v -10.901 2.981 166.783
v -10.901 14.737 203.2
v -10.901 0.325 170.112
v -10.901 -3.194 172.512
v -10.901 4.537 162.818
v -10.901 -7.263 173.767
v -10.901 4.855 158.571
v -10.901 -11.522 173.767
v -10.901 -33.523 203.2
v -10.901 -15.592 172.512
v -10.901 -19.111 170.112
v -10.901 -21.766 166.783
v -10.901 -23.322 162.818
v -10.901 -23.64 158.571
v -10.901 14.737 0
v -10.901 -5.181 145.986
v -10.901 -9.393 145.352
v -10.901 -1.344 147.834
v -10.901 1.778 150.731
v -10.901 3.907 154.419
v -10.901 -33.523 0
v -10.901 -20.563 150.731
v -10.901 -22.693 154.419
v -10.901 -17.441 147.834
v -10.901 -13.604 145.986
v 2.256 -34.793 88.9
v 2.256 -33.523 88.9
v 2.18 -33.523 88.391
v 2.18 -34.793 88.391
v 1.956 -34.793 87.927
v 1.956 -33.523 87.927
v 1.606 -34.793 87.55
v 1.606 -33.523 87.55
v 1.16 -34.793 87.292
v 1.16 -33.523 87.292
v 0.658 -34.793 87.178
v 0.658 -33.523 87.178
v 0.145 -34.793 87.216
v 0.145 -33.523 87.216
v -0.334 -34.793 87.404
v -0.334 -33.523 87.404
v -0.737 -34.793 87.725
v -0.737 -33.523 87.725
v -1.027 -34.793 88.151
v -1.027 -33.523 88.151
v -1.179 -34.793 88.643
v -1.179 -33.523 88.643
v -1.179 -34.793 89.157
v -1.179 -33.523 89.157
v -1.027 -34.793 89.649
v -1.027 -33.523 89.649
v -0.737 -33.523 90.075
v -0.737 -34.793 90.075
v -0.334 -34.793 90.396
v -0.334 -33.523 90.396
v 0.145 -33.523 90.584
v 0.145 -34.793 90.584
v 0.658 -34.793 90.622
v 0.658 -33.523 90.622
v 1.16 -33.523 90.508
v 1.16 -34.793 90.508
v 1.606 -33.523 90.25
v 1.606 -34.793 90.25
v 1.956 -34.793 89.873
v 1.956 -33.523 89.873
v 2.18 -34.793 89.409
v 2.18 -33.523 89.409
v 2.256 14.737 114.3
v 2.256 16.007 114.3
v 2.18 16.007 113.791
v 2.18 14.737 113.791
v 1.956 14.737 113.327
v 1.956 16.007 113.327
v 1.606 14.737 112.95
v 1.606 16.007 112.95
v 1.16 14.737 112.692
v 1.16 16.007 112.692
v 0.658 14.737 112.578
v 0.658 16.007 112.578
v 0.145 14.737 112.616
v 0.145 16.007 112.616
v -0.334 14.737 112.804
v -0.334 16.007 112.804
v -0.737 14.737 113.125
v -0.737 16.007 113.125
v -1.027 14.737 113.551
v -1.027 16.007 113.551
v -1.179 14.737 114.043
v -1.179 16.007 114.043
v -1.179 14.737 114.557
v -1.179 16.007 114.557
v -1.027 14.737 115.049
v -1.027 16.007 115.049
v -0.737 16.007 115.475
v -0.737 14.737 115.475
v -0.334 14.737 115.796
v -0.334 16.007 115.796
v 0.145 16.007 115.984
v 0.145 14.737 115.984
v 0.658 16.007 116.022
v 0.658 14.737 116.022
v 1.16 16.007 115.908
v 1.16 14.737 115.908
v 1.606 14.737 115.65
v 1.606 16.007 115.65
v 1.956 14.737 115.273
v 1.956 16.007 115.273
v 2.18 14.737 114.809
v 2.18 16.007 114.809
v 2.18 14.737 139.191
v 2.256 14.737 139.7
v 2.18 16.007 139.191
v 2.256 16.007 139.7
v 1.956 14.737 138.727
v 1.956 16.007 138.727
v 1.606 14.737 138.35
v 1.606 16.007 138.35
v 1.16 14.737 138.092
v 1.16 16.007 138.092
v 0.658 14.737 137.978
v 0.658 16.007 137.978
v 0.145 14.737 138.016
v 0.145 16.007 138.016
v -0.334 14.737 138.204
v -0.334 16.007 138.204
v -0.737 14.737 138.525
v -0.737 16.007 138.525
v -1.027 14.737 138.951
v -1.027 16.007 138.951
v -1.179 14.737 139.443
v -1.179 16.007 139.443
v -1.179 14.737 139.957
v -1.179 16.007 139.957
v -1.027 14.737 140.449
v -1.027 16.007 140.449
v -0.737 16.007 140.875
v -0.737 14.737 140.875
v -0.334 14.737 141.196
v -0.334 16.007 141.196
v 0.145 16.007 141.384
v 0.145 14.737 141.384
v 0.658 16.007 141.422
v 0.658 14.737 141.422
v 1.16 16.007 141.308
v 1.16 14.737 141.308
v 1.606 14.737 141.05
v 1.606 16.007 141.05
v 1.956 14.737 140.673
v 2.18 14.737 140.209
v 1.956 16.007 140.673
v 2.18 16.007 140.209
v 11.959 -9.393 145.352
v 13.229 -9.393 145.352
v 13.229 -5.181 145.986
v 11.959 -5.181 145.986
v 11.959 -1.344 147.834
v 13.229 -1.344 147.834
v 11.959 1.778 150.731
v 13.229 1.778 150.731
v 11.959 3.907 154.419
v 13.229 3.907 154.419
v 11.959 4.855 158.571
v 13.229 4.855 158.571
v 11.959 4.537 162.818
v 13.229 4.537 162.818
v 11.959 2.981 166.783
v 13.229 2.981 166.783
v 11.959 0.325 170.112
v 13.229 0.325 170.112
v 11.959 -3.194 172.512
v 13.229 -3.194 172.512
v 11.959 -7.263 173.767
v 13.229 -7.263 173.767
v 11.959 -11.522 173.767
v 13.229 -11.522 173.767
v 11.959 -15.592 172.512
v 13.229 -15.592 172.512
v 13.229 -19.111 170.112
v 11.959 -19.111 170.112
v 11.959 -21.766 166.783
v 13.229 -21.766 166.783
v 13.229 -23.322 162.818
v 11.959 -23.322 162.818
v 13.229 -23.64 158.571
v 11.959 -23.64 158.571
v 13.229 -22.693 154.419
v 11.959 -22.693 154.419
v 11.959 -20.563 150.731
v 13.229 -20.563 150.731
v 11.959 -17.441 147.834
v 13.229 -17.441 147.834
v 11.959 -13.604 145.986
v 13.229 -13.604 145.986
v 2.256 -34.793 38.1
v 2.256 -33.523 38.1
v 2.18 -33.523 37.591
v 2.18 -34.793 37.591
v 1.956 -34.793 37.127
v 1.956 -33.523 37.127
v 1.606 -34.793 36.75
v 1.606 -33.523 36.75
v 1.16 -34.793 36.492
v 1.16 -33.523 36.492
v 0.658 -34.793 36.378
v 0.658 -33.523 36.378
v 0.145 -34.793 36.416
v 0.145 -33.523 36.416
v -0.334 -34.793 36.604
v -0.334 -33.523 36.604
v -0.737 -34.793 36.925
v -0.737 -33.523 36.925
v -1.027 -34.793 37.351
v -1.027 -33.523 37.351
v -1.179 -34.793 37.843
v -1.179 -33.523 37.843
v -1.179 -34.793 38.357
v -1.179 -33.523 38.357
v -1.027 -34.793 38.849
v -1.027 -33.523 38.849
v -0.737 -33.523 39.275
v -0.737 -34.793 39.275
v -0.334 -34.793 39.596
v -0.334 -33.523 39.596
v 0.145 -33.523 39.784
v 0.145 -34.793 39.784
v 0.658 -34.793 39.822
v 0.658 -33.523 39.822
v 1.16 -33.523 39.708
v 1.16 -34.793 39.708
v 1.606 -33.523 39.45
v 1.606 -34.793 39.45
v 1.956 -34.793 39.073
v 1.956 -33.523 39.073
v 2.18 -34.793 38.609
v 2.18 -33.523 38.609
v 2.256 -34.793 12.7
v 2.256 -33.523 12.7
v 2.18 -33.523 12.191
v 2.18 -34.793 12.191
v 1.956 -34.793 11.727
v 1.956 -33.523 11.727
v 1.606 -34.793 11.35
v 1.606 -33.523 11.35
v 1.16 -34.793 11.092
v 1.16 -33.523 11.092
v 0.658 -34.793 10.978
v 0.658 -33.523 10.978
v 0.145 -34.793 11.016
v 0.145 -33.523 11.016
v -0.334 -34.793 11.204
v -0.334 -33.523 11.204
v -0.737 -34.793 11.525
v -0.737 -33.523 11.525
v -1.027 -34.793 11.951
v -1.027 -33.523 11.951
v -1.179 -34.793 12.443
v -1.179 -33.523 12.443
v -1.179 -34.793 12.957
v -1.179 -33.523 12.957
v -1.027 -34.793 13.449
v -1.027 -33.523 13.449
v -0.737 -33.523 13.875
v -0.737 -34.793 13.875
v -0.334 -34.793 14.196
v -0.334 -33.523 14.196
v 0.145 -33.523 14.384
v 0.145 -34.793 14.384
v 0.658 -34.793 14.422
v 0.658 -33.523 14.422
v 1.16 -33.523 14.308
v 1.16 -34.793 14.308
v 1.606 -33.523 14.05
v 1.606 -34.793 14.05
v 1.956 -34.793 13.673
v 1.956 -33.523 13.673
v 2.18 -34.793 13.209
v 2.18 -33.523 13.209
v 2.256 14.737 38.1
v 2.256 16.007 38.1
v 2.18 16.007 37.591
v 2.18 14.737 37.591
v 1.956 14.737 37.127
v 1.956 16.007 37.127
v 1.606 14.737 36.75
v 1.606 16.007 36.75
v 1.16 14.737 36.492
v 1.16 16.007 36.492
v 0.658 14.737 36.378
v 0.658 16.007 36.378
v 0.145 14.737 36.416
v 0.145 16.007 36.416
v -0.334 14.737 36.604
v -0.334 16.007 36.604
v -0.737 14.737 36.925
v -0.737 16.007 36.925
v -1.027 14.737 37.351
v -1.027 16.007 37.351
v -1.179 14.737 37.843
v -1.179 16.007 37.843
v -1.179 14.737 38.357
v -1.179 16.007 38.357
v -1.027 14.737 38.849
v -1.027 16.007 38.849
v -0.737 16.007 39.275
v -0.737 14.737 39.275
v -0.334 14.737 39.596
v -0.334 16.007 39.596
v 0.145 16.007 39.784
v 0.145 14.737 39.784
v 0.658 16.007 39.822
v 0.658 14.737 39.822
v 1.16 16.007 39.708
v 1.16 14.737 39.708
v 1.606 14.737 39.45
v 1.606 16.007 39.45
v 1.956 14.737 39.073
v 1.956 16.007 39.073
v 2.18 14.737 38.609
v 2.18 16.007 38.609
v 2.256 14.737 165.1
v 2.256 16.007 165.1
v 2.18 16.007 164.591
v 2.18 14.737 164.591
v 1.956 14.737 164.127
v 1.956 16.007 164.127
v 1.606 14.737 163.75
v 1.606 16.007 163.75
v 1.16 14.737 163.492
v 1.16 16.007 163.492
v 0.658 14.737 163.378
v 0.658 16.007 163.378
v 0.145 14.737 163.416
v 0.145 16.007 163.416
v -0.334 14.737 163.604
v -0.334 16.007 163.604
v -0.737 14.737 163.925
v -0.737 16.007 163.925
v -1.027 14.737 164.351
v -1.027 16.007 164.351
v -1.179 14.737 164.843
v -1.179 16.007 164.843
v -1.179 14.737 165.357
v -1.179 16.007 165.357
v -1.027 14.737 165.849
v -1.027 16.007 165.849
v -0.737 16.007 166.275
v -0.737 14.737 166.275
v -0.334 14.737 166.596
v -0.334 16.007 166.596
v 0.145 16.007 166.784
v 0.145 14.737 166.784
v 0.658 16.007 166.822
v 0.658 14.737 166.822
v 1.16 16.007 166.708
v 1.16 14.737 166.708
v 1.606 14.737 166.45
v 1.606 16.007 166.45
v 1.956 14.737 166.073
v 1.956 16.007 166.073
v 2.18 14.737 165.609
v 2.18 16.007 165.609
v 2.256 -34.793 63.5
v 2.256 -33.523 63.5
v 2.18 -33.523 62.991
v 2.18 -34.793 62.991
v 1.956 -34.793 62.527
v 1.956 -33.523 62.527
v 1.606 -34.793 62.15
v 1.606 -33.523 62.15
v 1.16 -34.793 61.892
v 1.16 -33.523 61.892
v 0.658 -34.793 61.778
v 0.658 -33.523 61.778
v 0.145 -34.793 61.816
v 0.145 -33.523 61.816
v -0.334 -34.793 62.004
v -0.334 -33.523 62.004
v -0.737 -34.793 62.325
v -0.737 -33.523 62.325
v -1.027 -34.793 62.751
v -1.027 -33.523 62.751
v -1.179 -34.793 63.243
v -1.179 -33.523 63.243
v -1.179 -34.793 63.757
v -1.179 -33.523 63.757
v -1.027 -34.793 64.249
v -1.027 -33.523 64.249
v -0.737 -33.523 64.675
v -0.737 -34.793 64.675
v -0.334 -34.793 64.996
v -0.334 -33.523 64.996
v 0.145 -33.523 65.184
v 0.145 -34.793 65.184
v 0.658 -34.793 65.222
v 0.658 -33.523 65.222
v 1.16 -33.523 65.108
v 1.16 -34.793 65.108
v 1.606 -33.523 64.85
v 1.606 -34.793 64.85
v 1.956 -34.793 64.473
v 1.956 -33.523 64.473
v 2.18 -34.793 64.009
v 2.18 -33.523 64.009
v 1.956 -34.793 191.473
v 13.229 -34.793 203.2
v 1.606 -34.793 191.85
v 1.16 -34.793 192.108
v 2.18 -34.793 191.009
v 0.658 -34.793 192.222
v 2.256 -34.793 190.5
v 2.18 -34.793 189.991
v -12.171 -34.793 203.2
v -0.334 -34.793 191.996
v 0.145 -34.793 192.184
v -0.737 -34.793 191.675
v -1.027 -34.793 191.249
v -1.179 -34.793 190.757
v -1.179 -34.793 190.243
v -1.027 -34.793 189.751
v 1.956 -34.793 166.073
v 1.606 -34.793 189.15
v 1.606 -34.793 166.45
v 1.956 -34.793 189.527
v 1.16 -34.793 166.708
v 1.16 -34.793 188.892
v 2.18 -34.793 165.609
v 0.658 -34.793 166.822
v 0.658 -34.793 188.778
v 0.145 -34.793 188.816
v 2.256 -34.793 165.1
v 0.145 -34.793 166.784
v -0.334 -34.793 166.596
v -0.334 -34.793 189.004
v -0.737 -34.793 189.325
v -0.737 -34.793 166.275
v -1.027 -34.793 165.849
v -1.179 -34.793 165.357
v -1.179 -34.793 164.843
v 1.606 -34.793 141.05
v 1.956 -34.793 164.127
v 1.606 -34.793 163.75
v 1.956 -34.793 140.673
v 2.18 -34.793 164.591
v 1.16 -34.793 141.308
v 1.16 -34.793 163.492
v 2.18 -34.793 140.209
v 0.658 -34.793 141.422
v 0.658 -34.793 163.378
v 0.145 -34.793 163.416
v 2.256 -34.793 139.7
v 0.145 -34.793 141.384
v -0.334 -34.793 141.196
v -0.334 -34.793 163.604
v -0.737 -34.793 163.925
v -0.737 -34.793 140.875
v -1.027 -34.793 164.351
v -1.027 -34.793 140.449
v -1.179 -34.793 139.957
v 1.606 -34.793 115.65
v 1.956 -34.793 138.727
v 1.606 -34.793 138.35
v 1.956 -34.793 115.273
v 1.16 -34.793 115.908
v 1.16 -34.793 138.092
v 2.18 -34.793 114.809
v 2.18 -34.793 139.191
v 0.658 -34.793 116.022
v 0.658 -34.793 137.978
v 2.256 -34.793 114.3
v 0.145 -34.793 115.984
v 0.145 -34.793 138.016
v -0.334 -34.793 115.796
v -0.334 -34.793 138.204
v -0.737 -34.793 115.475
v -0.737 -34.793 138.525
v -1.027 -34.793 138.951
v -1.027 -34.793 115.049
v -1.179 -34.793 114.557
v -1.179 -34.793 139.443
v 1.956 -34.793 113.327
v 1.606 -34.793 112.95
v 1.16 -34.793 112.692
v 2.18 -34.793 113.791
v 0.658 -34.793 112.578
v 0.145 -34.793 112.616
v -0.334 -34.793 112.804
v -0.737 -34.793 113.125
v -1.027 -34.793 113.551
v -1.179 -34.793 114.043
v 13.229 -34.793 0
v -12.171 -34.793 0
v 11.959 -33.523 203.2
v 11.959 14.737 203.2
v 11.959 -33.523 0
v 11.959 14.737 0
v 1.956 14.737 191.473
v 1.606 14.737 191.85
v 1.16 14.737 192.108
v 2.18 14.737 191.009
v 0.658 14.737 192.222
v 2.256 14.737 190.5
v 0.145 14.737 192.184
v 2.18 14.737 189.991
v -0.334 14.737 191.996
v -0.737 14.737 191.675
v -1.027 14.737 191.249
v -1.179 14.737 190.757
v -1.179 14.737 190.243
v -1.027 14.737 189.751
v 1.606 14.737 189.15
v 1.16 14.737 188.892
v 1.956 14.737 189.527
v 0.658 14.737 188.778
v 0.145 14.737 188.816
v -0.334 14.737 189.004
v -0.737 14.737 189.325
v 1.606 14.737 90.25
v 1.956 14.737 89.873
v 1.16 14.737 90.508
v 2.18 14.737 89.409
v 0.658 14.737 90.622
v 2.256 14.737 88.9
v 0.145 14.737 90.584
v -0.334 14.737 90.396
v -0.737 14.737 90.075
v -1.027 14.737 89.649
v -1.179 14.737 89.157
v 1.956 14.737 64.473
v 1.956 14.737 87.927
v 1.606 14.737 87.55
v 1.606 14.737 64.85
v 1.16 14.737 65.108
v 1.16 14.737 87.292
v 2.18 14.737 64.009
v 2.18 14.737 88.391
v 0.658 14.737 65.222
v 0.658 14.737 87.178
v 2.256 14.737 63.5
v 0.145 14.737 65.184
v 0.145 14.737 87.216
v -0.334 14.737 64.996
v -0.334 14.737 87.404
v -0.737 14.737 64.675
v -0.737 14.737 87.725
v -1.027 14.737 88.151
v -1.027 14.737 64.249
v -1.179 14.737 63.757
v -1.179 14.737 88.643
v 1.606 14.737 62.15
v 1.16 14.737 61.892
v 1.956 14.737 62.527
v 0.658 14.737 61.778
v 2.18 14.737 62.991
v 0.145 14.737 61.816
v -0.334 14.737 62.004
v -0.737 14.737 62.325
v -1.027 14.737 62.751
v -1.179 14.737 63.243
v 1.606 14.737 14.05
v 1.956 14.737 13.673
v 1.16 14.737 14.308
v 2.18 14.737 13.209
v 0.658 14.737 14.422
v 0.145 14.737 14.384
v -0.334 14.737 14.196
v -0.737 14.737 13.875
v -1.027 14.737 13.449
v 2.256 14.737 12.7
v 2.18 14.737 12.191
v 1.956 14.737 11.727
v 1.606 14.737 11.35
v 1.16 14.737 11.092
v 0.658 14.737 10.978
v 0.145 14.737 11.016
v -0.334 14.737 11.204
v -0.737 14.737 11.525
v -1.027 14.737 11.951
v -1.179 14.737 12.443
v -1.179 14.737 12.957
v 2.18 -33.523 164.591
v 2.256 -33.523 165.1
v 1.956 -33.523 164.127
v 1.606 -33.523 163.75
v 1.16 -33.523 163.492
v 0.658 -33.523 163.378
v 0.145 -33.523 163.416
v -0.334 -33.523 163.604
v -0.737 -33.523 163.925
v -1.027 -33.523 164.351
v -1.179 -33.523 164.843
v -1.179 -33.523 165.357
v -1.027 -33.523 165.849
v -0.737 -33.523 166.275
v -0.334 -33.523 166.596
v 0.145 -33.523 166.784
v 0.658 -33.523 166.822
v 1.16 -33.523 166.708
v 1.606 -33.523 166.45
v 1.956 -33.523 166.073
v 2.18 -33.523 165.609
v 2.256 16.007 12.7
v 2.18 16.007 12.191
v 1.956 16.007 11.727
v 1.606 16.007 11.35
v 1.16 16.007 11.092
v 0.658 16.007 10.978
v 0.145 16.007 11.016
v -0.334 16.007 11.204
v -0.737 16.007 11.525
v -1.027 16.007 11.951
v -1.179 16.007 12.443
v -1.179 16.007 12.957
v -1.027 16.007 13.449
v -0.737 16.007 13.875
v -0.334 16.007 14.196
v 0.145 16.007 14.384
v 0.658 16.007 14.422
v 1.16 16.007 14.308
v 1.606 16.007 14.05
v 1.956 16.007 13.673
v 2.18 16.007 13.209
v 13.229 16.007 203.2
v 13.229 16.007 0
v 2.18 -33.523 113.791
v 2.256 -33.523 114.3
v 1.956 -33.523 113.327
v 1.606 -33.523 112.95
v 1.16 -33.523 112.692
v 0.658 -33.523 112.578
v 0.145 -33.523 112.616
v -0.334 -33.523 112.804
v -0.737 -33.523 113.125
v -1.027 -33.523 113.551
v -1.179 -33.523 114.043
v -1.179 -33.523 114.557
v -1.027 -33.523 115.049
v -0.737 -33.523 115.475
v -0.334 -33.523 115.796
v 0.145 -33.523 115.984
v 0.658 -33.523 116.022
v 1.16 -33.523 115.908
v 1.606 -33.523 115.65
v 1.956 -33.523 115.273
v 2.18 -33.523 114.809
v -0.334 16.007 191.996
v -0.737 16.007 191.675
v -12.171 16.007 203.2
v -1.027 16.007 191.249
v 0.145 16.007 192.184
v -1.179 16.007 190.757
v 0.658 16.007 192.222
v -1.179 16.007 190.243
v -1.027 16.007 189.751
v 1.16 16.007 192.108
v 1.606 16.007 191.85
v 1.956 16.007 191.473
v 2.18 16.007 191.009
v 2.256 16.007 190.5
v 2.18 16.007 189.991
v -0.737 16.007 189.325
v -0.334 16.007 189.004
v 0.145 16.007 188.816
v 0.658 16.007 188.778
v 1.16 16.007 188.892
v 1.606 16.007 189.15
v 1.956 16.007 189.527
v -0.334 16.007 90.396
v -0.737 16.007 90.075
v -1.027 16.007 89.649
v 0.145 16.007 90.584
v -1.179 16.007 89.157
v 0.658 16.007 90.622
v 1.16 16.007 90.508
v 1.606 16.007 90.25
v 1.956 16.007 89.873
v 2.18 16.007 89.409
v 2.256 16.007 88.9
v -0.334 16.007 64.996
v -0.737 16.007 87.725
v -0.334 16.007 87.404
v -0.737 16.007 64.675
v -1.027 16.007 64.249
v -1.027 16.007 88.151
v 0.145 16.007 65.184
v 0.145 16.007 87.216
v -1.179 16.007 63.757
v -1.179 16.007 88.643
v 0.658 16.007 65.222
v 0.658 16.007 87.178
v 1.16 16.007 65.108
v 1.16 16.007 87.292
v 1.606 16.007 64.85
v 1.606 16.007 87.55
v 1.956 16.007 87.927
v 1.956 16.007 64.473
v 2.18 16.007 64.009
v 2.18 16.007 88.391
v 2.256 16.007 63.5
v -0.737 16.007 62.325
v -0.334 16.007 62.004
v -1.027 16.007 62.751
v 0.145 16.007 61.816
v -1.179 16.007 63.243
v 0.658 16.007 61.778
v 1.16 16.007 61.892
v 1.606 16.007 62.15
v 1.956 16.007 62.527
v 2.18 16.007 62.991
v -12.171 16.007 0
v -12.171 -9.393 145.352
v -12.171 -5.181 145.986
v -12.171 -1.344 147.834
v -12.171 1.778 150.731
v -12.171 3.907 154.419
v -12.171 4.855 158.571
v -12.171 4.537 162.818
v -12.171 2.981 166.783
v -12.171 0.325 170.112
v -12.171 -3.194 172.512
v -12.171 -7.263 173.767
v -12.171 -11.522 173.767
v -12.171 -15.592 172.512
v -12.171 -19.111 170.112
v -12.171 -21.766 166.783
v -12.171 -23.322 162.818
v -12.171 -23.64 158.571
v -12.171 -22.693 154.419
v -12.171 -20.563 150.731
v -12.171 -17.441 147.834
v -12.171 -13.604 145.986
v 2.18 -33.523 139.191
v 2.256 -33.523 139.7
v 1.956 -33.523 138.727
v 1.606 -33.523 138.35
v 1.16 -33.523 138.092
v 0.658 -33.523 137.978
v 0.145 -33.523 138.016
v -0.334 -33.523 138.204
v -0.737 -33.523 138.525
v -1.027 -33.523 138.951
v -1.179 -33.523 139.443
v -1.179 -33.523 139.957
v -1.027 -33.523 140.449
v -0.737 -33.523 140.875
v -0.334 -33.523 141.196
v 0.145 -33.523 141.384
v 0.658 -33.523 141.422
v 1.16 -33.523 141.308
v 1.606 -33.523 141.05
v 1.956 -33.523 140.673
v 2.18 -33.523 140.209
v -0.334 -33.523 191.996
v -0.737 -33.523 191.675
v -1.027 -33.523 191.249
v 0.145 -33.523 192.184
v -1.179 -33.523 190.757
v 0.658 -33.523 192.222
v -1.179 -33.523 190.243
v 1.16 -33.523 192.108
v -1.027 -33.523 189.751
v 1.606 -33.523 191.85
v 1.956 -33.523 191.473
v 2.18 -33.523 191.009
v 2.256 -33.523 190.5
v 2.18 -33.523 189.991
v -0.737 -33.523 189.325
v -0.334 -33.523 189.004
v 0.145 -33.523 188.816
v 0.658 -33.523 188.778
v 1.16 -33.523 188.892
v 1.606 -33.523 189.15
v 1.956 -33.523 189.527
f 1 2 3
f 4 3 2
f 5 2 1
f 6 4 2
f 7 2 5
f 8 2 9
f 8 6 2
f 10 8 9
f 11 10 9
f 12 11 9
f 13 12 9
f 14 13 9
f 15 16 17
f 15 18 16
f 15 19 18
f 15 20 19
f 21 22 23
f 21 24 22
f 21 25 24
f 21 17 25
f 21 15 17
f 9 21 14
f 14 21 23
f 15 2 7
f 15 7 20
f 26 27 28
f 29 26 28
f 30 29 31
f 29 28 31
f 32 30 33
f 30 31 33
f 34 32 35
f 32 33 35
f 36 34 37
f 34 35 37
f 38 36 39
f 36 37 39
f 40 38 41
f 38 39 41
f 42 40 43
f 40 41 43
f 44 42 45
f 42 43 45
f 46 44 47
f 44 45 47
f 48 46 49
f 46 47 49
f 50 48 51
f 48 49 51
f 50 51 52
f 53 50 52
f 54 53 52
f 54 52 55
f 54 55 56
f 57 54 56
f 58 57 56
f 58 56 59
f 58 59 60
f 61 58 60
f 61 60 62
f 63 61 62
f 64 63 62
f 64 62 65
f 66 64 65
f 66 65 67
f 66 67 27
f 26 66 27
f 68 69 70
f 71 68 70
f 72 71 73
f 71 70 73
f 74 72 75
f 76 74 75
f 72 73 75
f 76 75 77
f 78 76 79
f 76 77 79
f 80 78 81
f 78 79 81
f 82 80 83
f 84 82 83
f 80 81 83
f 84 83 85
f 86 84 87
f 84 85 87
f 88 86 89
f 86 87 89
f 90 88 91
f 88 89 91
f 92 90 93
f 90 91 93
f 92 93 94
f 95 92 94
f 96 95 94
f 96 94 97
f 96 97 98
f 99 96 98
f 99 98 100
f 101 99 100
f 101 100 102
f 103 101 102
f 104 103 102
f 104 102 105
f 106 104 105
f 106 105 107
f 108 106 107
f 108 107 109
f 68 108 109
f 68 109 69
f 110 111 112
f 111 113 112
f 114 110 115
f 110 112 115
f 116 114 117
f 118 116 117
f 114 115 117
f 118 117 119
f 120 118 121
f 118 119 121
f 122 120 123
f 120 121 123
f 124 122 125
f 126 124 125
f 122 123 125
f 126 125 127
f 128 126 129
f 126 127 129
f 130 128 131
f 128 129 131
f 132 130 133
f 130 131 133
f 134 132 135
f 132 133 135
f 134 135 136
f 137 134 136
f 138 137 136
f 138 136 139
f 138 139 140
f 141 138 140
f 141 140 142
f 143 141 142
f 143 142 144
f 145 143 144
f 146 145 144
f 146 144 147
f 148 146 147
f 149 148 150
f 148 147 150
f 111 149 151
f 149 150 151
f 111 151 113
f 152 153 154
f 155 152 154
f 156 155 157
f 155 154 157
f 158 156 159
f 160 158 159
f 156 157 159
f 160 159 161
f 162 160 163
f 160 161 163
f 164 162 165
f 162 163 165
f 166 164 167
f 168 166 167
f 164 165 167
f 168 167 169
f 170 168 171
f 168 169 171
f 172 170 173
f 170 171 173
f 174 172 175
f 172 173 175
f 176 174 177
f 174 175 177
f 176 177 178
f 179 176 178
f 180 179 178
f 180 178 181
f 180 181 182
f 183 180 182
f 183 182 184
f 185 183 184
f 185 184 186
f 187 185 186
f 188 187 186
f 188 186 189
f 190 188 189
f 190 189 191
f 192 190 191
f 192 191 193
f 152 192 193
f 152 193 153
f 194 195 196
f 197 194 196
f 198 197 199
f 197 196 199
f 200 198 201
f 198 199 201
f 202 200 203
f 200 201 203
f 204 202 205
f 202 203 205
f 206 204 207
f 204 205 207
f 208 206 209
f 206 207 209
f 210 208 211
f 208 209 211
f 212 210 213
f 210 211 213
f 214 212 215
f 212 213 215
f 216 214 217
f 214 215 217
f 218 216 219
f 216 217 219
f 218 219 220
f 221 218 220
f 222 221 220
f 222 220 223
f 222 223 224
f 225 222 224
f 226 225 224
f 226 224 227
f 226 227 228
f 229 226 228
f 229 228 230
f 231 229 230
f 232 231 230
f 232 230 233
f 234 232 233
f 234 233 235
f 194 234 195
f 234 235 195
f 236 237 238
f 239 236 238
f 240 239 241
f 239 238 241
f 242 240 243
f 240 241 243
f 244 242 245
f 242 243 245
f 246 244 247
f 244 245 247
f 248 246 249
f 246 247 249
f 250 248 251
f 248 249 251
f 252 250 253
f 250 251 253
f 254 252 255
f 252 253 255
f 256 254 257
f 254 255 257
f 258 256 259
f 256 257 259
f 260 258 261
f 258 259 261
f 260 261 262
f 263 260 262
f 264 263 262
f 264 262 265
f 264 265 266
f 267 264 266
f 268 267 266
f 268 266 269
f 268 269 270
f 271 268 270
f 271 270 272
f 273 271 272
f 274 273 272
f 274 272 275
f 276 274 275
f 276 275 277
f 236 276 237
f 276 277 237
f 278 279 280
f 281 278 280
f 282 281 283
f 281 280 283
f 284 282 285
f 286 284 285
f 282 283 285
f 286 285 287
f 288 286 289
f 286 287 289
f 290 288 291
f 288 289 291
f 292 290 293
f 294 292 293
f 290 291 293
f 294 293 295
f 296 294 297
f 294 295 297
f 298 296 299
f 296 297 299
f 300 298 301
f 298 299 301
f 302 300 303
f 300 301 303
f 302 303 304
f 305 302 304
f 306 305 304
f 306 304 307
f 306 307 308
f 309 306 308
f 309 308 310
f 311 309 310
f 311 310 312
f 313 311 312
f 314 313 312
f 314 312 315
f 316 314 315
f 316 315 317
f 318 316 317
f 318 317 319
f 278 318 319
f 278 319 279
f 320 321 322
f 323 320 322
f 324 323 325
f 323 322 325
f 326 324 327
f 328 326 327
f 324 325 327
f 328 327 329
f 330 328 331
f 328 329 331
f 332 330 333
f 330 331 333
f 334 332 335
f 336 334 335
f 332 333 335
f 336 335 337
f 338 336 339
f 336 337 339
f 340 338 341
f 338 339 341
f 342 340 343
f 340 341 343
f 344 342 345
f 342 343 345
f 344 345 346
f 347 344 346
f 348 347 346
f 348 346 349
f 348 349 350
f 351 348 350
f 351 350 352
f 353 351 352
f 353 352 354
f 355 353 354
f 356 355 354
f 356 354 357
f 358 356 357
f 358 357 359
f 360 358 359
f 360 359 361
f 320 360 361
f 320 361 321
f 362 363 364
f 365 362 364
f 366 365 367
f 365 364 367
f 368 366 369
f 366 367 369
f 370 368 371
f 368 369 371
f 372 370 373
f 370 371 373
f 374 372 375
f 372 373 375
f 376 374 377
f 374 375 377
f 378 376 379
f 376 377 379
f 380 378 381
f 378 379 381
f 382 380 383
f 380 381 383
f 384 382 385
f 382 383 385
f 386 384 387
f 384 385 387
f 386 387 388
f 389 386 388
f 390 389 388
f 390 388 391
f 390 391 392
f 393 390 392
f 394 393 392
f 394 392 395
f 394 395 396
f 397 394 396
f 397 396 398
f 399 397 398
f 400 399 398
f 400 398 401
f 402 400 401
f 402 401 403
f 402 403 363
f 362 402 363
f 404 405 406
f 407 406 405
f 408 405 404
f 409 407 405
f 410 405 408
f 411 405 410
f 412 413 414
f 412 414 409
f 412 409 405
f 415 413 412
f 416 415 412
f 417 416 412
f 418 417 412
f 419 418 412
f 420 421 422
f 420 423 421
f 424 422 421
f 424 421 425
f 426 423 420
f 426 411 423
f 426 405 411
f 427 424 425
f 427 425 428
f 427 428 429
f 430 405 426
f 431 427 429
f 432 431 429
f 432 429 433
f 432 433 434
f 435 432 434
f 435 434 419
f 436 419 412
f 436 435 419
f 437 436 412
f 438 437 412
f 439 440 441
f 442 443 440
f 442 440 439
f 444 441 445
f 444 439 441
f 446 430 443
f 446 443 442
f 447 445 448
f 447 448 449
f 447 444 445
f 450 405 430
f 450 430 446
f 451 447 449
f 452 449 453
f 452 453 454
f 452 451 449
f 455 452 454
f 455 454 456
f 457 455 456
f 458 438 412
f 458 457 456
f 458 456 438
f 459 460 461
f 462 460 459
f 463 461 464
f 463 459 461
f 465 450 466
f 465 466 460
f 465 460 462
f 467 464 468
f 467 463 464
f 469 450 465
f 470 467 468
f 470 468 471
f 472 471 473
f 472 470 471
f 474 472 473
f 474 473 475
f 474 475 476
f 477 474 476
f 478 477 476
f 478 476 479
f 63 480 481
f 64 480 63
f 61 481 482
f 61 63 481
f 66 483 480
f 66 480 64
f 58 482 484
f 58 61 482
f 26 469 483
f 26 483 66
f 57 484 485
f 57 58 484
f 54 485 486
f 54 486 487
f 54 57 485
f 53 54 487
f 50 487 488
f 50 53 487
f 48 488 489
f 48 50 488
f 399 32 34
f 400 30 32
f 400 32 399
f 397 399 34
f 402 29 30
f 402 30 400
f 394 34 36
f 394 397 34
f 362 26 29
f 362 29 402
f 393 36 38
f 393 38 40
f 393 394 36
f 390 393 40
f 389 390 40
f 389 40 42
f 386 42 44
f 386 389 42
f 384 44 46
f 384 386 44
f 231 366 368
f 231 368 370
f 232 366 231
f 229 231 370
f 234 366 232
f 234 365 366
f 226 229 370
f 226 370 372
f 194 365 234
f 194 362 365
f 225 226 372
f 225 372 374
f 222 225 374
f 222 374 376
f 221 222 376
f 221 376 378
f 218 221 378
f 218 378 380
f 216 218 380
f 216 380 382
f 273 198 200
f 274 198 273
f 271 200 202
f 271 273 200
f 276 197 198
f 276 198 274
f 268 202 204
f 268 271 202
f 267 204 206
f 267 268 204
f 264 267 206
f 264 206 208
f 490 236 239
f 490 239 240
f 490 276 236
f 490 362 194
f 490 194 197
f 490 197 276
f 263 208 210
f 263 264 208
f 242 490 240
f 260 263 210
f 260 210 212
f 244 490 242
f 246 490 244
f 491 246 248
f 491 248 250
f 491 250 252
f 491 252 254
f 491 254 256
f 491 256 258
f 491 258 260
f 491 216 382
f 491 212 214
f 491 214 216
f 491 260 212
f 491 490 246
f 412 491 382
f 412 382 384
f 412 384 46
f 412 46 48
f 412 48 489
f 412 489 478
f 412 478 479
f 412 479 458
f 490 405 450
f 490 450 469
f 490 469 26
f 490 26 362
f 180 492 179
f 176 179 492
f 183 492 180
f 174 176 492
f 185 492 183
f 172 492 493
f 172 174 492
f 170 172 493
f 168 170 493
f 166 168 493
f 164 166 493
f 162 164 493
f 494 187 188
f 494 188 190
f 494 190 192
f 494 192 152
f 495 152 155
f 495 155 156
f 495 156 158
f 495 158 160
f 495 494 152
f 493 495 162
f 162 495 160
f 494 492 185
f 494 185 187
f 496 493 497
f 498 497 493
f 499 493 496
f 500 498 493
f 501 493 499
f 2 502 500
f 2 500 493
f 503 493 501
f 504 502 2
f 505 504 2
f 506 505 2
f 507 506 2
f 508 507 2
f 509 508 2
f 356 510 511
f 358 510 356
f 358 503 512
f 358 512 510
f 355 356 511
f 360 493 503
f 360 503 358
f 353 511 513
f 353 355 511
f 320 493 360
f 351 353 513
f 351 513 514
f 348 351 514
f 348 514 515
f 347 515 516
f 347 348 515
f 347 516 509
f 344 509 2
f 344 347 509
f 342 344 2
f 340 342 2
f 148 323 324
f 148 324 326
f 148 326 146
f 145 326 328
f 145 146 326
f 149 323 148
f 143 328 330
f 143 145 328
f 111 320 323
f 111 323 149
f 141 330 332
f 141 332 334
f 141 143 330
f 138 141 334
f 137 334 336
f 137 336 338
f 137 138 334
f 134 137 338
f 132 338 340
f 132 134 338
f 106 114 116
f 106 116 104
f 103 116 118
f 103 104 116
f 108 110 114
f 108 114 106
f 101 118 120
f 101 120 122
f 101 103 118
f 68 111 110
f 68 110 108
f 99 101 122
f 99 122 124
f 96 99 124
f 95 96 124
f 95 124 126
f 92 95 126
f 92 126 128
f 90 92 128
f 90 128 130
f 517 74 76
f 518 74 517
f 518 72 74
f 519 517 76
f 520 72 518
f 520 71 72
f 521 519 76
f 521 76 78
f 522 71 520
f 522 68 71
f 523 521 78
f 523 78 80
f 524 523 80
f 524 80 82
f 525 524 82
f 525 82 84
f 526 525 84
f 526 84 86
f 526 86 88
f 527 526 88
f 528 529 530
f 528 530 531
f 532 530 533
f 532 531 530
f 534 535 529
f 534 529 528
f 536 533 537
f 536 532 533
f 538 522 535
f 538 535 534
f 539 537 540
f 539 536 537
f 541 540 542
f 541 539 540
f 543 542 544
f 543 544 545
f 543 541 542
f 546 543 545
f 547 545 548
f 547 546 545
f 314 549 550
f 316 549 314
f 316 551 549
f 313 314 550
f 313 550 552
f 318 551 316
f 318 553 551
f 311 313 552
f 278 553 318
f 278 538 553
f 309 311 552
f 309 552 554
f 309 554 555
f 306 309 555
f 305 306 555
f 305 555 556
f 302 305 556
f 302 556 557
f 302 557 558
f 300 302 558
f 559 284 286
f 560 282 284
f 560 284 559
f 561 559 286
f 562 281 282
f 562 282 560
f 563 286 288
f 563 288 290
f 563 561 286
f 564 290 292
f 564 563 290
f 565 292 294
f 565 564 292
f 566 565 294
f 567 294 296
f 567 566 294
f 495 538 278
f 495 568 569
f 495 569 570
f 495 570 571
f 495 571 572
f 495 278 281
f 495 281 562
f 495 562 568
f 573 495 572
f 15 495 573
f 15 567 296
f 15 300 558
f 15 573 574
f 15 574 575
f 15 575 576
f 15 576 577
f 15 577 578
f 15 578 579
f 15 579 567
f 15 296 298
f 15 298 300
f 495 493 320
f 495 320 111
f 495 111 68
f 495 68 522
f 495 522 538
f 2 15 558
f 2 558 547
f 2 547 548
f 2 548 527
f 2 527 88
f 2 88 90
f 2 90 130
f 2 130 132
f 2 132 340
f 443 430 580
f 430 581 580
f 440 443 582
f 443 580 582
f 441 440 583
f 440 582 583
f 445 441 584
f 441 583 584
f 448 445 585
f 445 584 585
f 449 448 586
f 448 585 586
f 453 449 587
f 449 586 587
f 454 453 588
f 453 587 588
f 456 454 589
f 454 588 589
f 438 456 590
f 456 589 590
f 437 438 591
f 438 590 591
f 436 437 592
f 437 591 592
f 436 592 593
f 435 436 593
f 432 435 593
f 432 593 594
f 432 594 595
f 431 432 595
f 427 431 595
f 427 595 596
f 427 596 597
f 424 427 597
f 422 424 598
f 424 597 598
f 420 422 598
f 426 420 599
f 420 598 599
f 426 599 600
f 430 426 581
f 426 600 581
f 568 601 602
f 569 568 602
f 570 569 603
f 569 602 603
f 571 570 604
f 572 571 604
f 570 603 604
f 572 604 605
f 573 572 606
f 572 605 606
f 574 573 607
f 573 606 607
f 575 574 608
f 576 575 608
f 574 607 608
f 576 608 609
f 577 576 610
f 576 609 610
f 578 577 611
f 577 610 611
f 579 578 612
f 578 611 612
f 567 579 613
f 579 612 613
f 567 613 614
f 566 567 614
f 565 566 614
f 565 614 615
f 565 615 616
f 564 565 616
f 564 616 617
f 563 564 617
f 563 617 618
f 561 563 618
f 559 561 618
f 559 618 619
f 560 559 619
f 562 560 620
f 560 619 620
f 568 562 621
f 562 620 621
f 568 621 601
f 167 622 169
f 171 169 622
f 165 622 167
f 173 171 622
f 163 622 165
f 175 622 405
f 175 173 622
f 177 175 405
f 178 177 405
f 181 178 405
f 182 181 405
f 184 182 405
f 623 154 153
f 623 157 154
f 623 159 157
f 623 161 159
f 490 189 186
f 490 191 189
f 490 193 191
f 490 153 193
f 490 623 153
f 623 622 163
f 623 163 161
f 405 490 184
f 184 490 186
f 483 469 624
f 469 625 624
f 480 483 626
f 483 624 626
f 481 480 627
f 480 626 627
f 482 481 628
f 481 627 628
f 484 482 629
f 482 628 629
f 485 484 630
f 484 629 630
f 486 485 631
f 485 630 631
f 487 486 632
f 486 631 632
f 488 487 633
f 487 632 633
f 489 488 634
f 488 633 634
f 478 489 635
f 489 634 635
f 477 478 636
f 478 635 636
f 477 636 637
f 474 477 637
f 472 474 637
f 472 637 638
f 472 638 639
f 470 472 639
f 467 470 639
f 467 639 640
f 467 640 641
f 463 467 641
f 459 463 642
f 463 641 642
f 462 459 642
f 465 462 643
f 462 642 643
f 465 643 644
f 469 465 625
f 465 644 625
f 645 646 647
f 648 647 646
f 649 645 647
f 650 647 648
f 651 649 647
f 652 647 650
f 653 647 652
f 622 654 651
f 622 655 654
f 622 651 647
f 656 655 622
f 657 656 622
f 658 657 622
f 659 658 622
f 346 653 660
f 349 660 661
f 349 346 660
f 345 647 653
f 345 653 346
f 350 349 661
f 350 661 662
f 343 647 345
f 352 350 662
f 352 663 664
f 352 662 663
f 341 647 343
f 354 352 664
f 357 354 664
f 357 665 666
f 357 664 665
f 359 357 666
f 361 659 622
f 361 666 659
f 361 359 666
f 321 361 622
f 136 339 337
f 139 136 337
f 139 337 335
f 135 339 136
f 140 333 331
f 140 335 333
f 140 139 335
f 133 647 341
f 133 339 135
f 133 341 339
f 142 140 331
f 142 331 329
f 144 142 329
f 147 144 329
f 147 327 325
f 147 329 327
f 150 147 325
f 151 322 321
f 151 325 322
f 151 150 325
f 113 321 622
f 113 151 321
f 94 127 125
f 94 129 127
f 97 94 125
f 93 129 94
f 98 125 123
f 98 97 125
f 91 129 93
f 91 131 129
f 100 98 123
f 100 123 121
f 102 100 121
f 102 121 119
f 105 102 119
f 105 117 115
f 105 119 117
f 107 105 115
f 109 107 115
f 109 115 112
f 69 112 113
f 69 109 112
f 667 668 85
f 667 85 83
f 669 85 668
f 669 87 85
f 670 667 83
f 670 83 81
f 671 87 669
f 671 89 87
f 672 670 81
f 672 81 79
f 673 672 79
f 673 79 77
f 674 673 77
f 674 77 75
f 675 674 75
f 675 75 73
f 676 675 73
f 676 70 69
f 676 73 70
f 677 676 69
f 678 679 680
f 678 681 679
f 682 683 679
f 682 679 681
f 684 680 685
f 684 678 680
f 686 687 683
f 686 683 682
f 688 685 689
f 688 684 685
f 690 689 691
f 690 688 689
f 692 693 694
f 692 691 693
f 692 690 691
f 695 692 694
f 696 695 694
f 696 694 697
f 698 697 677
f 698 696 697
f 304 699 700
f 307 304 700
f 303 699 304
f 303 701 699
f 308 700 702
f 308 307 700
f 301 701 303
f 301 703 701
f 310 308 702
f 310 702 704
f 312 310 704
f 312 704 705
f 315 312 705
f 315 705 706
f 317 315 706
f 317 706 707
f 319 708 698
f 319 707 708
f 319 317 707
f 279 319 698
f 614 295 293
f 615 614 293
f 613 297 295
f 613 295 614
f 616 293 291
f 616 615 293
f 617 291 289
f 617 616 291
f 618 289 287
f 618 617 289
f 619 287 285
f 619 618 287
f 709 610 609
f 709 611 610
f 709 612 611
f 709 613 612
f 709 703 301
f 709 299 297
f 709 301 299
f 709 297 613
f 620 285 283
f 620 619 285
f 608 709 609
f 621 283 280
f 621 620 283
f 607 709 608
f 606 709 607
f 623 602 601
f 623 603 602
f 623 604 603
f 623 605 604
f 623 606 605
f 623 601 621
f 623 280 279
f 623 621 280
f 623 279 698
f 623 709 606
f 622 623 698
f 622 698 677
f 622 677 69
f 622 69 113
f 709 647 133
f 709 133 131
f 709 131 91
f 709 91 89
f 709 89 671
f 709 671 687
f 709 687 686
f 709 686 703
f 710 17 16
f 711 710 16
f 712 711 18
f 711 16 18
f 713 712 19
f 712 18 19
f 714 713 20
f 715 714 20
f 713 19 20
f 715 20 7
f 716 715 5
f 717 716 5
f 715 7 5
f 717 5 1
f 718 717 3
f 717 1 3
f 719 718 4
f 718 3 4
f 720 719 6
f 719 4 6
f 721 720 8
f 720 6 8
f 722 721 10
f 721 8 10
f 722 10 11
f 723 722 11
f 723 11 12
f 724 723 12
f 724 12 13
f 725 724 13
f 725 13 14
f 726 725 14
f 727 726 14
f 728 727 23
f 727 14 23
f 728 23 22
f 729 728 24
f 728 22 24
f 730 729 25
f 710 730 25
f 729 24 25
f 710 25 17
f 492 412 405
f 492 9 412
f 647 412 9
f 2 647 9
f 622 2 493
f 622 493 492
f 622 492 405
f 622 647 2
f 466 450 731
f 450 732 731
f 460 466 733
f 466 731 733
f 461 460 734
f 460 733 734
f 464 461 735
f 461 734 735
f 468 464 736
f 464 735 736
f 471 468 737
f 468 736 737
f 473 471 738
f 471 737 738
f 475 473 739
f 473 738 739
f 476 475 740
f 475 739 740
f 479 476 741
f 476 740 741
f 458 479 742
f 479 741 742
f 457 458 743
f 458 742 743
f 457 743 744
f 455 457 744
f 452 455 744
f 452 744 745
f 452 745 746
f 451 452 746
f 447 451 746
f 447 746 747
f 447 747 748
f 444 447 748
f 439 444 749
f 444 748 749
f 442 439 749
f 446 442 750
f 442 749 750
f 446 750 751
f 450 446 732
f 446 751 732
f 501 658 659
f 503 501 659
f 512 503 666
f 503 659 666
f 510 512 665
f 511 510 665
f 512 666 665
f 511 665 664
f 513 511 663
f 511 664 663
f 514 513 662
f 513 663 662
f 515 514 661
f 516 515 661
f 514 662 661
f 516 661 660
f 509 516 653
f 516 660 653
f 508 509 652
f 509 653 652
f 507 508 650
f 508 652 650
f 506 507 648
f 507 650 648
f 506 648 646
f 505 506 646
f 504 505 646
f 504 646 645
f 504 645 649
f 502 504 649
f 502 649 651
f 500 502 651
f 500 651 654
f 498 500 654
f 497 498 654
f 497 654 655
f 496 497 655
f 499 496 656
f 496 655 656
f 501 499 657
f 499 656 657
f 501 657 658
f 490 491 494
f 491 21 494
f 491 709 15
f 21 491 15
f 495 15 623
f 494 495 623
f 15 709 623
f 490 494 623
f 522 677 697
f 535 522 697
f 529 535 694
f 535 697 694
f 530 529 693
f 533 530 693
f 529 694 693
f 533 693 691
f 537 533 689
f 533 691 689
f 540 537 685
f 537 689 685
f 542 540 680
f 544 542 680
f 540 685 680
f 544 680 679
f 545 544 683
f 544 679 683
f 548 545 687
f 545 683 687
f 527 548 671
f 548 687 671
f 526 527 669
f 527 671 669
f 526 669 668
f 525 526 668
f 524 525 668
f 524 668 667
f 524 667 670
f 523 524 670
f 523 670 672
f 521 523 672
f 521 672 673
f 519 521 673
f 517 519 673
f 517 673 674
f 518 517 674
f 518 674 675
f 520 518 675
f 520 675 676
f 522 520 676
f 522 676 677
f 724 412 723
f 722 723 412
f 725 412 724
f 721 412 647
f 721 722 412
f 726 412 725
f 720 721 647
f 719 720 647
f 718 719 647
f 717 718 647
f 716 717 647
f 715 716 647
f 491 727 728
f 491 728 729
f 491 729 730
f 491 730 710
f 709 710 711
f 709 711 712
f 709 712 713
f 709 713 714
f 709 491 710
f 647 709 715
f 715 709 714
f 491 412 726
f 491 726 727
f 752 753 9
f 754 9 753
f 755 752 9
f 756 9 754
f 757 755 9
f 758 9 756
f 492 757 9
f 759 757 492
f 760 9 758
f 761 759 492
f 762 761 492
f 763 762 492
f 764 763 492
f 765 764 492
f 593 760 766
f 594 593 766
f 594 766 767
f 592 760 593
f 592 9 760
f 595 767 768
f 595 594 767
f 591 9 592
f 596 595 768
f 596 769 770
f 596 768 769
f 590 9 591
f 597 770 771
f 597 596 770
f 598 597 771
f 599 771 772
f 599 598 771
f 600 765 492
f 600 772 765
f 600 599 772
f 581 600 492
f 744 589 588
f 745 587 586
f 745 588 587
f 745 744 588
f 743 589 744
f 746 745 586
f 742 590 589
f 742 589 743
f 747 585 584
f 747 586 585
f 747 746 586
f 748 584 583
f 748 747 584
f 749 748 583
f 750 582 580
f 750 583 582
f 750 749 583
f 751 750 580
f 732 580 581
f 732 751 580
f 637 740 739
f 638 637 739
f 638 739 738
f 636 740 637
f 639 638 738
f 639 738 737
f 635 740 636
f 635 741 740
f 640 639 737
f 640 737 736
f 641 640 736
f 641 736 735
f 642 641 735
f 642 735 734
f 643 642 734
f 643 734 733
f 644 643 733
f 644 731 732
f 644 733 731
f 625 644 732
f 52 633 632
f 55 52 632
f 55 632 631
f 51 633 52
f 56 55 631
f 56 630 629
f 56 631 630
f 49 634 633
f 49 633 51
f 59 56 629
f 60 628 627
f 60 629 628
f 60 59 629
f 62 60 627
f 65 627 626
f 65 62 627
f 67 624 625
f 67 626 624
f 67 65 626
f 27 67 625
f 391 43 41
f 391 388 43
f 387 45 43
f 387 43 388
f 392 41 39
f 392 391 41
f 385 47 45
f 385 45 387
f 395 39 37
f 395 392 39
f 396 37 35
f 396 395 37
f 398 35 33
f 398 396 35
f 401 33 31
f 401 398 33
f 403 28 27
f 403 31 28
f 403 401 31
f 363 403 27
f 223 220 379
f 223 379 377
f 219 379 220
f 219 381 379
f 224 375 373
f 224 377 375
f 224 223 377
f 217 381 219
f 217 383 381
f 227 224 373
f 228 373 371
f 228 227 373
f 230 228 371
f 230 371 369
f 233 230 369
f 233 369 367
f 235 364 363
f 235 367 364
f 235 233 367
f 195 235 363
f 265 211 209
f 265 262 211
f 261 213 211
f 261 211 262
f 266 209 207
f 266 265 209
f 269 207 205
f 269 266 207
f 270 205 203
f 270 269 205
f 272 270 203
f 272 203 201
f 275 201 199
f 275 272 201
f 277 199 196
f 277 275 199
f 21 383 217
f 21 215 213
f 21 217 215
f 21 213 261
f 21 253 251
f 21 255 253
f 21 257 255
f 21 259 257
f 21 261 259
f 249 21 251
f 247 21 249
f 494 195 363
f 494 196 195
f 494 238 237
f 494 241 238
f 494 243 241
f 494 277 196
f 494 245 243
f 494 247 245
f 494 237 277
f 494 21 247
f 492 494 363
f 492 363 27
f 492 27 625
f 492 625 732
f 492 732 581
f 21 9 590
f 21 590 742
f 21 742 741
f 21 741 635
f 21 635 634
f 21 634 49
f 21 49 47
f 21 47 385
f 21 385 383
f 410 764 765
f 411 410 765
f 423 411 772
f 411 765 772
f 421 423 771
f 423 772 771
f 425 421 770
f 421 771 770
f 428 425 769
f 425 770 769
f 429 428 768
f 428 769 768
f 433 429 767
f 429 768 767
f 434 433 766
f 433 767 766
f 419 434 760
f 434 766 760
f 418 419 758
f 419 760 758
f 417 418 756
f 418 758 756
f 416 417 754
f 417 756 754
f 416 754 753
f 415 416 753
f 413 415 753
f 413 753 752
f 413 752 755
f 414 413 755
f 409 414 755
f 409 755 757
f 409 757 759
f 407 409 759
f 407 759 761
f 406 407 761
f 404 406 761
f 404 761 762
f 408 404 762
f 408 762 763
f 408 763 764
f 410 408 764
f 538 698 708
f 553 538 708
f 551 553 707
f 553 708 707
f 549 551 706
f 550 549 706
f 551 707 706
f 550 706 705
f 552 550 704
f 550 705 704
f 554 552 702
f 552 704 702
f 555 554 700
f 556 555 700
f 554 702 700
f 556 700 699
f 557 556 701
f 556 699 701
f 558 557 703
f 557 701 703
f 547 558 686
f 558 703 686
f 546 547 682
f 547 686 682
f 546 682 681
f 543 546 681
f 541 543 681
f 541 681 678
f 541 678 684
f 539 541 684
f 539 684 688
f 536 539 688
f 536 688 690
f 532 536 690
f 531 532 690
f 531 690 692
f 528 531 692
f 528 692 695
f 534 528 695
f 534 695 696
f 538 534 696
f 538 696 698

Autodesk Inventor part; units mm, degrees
ref_plane "YZ Plane" through (0, 0, 0) normal (1, 0, 0) x (0, 1, 0)
ref_plane "XZ Plane" through (0, 0, 0) normal (0, 1, 0) x (-1, 0, 0)
ref_plane "XY Plane" through (0, 0, 0) normal (0, 0, 1) x (1, 0, 0)
sketch "Sketch1" plane through (0, 0, 0) normal (0, 0, 1) x (1, 0, 0)
  line L0 (-12.1708, 16.0073) -> (13.2292, 16.0073)
  line L1 (13.2292, 16.0073) -> (13.2292, -34.7927)
  line L2 (13.2292, -34.7927) -> (-12.1708, -34.7927)
  line L3 (-12.1708, -34.7927) -> (-12.1708, 16.0073)
  line L4 (11.9592, 14.7373) -> (-10.9008, 14.7373)
  line L5 (-10.9008, 14.7373) -> (-10.9008, -33.5227)
  line L6 (-10.9008, -33.5227) -> (11.9592, -33.5227)
  line L7 (11.9592, -33.5227) -> (11.9592, 14.7373)
  point P0 (0, 0)
  dimension "d0" = 25.4
  dimension "d1" = 50.8
  dimension "d2" = 1.27
extrude "Extrusion1" add sketch "Sketch1" along normal blind 203.2
sketch "Sketch2" plane through (-12.1708, 16.0073, 0) normal (0, 1, 0) x (1, 0, 0)
  circle A0 centre (12.7, -12.7) radius 1.7272
  line L0 (25.4, 0) -> (0, 0) projected
  line L1 (0, 0) -> (0, -203.2) projected
  point P0 (12.1708, 0)
  dimension "d5" = 3.4544
  dimension "d6" = 12.7
  dimension "d7" = 12.7
extrude "Extrusion2" cut sketch "Sketch2" against normal through all
pattern_linear "Rectangular Pattern1" count 20 spacing 25.4 along (0, 0, 1) of "Extrusion2"
sketch "Sketch4" plane through (13.2292, -34.7927, 0) normal (1, 0, 0) x (0, 0, -1)
  circle A0 centre (-159.639, 25.4) radius 14.2875
  line L0 (0, 0) -> (0, 50.8) projected
  line L1 (0, 50.8) -> (-203.2, 50.8) projected
  point P0 (0, 34.7927)
  dimension "d41" = 28.575
  dimension "d42" = 159.639
  dimension "d43" = 25.4
extrude "Extrusion4" cut sketch "Sketch4" against normal through all
equation "\"d3\" = d13"
equation "\"d10\" = d14"
equation "\"d13\" = 203.2"
equation "\"d14\" = d13"
equation "\"d32\" = 101.6"
properties part number "VersaFrame 28in"
